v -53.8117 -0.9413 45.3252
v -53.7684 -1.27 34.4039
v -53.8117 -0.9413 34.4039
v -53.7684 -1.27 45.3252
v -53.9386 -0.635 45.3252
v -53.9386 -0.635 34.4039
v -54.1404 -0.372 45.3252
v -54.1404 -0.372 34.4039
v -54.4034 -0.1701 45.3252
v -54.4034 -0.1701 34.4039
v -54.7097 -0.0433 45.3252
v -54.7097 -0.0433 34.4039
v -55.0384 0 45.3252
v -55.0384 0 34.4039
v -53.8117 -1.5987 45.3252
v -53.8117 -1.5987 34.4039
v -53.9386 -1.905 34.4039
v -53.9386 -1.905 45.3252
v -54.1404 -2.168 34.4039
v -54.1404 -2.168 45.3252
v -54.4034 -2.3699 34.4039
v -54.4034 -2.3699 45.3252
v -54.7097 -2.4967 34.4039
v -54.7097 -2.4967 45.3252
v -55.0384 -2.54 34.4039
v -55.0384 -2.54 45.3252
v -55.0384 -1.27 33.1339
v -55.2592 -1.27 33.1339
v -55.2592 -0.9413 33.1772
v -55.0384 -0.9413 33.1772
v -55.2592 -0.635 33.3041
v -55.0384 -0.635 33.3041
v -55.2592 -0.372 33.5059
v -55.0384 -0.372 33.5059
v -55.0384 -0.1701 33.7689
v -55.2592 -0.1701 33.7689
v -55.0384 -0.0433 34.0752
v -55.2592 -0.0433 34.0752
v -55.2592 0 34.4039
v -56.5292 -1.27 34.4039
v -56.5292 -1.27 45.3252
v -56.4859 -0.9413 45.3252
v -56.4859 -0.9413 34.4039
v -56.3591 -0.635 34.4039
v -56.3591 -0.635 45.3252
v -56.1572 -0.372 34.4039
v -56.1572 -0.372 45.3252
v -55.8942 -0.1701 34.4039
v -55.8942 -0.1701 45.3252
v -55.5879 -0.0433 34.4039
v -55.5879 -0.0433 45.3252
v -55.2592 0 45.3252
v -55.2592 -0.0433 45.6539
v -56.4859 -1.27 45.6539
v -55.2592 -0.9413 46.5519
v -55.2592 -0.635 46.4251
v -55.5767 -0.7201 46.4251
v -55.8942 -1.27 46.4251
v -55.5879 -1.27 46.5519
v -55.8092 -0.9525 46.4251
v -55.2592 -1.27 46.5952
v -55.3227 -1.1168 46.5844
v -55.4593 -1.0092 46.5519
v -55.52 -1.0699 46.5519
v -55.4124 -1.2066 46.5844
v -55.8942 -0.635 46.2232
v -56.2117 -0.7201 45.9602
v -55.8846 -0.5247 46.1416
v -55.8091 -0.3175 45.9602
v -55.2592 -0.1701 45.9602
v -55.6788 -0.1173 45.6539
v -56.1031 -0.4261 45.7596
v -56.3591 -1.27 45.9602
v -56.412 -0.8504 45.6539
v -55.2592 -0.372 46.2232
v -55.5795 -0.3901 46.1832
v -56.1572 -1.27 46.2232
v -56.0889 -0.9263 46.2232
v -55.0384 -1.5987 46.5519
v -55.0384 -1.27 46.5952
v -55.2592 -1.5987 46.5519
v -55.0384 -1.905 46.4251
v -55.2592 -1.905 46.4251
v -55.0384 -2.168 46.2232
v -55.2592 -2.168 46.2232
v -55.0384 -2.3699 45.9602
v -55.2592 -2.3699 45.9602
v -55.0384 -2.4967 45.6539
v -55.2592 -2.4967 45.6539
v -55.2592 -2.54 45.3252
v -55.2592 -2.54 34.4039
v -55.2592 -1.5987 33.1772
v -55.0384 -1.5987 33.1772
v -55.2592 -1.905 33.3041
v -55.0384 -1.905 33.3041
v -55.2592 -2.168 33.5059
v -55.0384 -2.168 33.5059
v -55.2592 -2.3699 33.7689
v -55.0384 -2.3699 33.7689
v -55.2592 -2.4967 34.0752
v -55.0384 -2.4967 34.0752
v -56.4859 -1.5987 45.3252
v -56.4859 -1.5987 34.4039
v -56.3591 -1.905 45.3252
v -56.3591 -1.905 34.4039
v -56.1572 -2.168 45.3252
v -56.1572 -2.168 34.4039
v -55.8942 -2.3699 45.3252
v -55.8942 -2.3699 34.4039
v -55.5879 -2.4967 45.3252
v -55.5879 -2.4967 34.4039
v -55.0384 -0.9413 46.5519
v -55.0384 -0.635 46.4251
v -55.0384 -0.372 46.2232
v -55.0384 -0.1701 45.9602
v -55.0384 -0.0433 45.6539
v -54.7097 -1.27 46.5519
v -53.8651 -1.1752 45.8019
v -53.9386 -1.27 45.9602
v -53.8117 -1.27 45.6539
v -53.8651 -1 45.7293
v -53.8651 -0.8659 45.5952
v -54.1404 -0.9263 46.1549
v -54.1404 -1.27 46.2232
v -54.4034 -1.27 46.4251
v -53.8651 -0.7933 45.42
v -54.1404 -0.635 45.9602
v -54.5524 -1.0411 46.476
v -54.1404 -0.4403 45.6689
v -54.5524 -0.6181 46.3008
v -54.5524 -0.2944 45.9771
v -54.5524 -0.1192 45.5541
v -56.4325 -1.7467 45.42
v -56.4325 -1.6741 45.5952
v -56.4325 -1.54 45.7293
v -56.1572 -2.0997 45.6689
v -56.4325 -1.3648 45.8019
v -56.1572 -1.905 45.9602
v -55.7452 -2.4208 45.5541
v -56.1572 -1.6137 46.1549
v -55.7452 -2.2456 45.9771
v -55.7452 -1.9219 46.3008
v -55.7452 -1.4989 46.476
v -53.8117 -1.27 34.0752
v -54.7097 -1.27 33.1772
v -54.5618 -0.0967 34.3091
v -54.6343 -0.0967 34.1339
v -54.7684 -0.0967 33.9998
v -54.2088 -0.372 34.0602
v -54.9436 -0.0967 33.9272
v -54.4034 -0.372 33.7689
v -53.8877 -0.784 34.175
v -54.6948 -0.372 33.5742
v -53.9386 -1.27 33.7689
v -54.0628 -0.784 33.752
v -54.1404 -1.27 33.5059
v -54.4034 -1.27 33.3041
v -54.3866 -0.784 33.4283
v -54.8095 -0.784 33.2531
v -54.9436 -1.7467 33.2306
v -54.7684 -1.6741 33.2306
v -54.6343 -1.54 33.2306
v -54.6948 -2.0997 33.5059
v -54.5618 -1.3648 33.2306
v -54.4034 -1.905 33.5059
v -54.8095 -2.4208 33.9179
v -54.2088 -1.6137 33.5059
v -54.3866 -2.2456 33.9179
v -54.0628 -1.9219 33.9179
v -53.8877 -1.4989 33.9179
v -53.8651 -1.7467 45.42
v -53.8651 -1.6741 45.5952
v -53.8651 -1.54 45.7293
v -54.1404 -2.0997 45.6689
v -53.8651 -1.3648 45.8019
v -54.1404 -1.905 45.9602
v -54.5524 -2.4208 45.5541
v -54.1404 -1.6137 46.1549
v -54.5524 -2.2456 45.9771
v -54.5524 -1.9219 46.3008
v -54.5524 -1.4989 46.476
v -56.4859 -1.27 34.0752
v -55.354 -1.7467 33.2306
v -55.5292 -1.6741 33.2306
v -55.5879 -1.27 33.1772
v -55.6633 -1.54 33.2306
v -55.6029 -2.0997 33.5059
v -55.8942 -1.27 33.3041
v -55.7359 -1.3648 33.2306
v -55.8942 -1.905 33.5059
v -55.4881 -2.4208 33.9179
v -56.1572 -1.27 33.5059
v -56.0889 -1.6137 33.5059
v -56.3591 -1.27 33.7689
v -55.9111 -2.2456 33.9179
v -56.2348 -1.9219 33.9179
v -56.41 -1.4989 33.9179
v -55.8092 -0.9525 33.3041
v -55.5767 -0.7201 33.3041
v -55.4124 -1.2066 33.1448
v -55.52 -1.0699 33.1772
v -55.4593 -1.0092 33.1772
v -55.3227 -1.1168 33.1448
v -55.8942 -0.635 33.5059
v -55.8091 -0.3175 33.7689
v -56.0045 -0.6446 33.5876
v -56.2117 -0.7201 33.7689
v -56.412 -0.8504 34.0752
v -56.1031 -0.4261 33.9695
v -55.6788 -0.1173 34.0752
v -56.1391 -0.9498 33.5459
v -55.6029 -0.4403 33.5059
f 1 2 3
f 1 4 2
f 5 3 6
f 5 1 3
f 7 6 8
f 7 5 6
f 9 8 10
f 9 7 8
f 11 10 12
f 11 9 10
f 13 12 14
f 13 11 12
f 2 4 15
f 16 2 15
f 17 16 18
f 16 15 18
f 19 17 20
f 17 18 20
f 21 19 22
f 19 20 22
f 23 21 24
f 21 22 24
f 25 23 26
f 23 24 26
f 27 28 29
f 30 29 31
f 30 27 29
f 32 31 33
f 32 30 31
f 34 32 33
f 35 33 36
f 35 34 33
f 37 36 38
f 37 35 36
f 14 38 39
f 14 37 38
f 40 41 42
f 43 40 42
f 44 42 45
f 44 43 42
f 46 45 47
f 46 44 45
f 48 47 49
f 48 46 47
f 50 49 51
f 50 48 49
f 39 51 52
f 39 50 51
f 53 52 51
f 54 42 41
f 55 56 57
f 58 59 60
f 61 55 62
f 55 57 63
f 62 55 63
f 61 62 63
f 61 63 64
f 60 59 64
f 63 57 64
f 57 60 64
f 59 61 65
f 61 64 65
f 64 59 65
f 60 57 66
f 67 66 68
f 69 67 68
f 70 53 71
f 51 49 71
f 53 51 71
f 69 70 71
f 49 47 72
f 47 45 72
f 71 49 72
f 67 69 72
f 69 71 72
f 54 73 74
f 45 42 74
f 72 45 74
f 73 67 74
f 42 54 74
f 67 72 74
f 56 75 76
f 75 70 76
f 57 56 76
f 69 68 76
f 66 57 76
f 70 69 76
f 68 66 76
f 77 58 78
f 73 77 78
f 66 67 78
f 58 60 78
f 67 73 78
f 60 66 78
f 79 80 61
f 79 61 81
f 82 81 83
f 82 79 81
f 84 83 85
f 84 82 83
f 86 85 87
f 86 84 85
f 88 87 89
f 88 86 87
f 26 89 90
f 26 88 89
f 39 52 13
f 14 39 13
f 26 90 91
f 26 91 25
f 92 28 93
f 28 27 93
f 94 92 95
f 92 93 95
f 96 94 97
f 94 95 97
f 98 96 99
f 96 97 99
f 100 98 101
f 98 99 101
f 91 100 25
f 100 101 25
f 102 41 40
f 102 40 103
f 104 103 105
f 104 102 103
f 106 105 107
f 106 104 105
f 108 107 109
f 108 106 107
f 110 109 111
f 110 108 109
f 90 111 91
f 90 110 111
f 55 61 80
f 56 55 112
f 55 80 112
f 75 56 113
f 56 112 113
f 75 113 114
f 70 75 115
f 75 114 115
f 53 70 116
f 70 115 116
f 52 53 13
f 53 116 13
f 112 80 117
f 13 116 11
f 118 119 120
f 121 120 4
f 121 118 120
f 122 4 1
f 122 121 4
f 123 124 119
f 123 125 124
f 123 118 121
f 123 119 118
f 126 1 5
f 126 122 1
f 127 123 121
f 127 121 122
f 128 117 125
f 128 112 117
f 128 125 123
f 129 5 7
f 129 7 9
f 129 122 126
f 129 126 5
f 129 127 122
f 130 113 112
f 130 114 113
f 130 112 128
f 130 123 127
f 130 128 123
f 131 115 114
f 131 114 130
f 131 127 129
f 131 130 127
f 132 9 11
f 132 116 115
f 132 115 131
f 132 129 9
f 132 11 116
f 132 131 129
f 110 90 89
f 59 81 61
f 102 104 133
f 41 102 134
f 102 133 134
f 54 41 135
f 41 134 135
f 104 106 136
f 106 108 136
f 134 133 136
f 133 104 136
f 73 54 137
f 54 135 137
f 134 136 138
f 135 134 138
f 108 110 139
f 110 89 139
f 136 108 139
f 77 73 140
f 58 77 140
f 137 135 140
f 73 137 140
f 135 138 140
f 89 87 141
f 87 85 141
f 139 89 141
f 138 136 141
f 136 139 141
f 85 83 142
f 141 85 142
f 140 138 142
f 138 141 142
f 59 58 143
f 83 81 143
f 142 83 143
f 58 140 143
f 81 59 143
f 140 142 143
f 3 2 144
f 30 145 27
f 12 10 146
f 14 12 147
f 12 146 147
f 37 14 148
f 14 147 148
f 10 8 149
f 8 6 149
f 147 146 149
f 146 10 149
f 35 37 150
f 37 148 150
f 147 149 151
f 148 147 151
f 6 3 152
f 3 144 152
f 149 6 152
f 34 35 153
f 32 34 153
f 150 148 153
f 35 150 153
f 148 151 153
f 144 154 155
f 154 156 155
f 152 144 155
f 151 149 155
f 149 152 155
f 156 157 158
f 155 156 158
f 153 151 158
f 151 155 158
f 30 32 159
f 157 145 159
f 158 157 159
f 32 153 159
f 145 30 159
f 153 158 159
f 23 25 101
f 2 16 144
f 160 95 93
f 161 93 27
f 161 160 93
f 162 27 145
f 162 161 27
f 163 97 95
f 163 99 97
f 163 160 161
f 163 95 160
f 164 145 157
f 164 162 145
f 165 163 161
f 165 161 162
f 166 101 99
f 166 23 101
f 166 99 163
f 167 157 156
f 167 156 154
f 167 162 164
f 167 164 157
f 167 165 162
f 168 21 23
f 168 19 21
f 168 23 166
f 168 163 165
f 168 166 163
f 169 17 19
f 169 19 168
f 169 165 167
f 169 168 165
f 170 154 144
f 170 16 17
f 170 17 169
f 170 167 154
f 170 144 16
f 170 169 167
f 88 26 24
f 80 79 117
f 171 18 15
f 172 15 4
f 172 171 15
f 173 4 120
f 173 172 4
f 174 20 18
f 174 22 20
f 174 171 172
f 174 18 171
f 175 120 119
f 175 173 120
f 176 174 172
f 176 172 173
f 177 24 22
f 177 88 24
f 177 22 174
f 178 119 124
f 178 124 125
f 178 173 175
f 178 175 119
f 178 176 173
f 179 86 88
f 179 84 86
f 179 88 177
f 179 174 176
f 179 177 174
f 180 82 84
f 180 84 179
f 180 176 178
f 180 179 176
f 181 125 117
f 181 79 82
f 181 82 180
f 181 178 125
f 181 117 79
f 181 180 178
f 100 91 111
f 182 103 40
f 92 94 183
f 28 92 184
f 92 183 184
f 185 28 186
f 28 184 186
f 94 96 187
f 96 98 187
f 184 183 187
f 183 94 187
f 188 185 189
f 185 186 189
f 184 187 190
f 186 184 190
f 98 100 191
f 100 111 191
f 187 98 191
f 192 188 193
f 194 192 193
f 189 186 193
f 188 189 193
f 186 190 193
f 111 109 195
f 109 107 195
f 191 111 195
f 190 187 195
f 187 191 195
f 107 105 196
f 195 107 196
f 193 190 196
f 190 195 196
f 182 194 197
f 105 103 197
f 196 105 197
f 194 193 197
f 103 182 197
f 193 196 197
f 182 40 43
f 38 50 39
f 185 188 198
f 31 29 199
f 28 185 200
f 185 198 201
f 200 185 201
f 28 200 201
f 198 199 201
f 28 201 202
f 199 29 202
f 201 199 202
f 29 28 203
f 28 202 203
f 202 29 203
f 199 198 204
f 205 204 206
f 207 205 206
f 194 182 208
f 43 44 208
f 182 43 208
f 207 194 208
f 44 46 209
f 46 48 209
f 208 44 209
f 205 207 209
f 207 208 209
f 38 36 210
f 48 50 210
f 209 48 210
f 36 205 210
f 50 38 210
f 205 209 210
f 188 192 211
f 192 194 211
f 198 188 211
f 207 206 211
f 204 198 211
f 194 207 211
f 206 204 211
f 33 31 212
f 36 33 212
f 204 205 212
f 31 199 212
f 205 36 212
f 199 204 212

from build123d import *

# Parameters (mm, degrees)
F0_W        = 2.7607865632
F0_H        = 13.4613066912
F1_DEPTH    = 2.54
F2_R        = 1.26999
F3_T1_DEPTH = 13.4613066912
F3_T4_ANGLE = 90
F3_T6_ANGLE = 90


# Not quite as in the source:
# - a fillet or chamfer that OpenCascade refuses, or shapes differently, is made with other operations: its cross-section is extruded or revolved along the edge and cut away or added
# - a fillet or chamfer is up to 0.001 mm smaller than in the source, because OpenCascade refuses the exact size


with BuildPart() as f1:
    # F0 (on Front) → F1 (new body)
    with BuildSketch(Plane.XZ):
        with Locations((-55.148826912, 39.8645661771)):
            Rectangle(F0_W, F0_H)
    extrude(amount=F1_DEPTH)

    # F2 (radius 1.27 in the source; OpenCascade refuses exactly that, so slightly less here)
    f2_edges = [f1.edges().sort_by_distance(p)[0] for p in [
        (-55.148827, -2.54, 46.59522),
        (-53.768434, -2.54, 39.864566),
        (-56.52922, -2.54, 39.864566),
        (-55.148827, -2.54, 33.133913),
        (-55.148827, 0, 46.59522),
        (-53.768434, -1.27, 46.59522),
        (-53.768434, -1.27, 33.133913),
        (-53.768434, 0, 39.864566),
        (-55.148827, 0, 33.133913),
        (-56.52922, -1.27, 46.59522),
        (-56.52922, -1.27, 33.133913),
    ]]
    fillet(f2_edges, radius=F2_R)

    # F3: fillet of radius 1.27 on 1 edges, made by hand

    # F3_s2 → F3_t1 (cut)
    with BuildSketch(Plane.XY.offset(33.1339128315)):
        with BuildLine():
            ThreePointArc((-56.5292201936, -1.27), (-56.1572458057, -0.3719743879), (-55.2592201936, 0))
            Line((-55.2592201936, 0), (-56.5292201936, 0))
            Line((-56.5292201936, 0), (-56.5292201936, -1.27))
        make_face()
    extrude(amount=F3_T1_DEPTH, mode=Mode.SUBTRACT)

    # F3_s3 → F3_t4 (revolve, cut)
    with BuildSketch(Plane.YZ.offset(-55.2592201936)):
        with BuildLine():
            ThreePointArc((-1.26999, 46.5952195227), (-0.371971459, 46.2232480638), (0, 45.3252295227))
            Line((0, 45.3252295227), (0, 46.5952195227))
            Line((0, 46.5952195227), (-1.26999, 46.5952195227))
        make_face()
    revolve(axis=Axis((-55.2592201936, -1.27, 46.5952195227), (0, 0, 1)), revolution_arc=F3_T4_ANGLE, mode=Mode.SUBTRACT)

    # F3_s5 → F3_t6 (revolve, cut)
    with BuildSketch(Plane.XZ.offset(1.27)):
        with BuildLine():
            ThreePointArc((-55.2592301936, 33.1339128315), (-56.1572487347, 33.5058842905), (-56.5292201936, 34.4039028315))
            Line((-56.5292201936, 34.4039028315), (-56.5292201936, 33.1339128315))
            Line((-56.5292201936, 33.1339128315), (-55.2592301936, 33.1339128315))
        make_face()
    revolve(axis=Axis((-55.2592201936, -1.27, 33.1339128315), (0, 0, -1)), revolution_arc=F3_T6_ANGLE, mode=Mode.SUBTRACT)


solid = f1.part
